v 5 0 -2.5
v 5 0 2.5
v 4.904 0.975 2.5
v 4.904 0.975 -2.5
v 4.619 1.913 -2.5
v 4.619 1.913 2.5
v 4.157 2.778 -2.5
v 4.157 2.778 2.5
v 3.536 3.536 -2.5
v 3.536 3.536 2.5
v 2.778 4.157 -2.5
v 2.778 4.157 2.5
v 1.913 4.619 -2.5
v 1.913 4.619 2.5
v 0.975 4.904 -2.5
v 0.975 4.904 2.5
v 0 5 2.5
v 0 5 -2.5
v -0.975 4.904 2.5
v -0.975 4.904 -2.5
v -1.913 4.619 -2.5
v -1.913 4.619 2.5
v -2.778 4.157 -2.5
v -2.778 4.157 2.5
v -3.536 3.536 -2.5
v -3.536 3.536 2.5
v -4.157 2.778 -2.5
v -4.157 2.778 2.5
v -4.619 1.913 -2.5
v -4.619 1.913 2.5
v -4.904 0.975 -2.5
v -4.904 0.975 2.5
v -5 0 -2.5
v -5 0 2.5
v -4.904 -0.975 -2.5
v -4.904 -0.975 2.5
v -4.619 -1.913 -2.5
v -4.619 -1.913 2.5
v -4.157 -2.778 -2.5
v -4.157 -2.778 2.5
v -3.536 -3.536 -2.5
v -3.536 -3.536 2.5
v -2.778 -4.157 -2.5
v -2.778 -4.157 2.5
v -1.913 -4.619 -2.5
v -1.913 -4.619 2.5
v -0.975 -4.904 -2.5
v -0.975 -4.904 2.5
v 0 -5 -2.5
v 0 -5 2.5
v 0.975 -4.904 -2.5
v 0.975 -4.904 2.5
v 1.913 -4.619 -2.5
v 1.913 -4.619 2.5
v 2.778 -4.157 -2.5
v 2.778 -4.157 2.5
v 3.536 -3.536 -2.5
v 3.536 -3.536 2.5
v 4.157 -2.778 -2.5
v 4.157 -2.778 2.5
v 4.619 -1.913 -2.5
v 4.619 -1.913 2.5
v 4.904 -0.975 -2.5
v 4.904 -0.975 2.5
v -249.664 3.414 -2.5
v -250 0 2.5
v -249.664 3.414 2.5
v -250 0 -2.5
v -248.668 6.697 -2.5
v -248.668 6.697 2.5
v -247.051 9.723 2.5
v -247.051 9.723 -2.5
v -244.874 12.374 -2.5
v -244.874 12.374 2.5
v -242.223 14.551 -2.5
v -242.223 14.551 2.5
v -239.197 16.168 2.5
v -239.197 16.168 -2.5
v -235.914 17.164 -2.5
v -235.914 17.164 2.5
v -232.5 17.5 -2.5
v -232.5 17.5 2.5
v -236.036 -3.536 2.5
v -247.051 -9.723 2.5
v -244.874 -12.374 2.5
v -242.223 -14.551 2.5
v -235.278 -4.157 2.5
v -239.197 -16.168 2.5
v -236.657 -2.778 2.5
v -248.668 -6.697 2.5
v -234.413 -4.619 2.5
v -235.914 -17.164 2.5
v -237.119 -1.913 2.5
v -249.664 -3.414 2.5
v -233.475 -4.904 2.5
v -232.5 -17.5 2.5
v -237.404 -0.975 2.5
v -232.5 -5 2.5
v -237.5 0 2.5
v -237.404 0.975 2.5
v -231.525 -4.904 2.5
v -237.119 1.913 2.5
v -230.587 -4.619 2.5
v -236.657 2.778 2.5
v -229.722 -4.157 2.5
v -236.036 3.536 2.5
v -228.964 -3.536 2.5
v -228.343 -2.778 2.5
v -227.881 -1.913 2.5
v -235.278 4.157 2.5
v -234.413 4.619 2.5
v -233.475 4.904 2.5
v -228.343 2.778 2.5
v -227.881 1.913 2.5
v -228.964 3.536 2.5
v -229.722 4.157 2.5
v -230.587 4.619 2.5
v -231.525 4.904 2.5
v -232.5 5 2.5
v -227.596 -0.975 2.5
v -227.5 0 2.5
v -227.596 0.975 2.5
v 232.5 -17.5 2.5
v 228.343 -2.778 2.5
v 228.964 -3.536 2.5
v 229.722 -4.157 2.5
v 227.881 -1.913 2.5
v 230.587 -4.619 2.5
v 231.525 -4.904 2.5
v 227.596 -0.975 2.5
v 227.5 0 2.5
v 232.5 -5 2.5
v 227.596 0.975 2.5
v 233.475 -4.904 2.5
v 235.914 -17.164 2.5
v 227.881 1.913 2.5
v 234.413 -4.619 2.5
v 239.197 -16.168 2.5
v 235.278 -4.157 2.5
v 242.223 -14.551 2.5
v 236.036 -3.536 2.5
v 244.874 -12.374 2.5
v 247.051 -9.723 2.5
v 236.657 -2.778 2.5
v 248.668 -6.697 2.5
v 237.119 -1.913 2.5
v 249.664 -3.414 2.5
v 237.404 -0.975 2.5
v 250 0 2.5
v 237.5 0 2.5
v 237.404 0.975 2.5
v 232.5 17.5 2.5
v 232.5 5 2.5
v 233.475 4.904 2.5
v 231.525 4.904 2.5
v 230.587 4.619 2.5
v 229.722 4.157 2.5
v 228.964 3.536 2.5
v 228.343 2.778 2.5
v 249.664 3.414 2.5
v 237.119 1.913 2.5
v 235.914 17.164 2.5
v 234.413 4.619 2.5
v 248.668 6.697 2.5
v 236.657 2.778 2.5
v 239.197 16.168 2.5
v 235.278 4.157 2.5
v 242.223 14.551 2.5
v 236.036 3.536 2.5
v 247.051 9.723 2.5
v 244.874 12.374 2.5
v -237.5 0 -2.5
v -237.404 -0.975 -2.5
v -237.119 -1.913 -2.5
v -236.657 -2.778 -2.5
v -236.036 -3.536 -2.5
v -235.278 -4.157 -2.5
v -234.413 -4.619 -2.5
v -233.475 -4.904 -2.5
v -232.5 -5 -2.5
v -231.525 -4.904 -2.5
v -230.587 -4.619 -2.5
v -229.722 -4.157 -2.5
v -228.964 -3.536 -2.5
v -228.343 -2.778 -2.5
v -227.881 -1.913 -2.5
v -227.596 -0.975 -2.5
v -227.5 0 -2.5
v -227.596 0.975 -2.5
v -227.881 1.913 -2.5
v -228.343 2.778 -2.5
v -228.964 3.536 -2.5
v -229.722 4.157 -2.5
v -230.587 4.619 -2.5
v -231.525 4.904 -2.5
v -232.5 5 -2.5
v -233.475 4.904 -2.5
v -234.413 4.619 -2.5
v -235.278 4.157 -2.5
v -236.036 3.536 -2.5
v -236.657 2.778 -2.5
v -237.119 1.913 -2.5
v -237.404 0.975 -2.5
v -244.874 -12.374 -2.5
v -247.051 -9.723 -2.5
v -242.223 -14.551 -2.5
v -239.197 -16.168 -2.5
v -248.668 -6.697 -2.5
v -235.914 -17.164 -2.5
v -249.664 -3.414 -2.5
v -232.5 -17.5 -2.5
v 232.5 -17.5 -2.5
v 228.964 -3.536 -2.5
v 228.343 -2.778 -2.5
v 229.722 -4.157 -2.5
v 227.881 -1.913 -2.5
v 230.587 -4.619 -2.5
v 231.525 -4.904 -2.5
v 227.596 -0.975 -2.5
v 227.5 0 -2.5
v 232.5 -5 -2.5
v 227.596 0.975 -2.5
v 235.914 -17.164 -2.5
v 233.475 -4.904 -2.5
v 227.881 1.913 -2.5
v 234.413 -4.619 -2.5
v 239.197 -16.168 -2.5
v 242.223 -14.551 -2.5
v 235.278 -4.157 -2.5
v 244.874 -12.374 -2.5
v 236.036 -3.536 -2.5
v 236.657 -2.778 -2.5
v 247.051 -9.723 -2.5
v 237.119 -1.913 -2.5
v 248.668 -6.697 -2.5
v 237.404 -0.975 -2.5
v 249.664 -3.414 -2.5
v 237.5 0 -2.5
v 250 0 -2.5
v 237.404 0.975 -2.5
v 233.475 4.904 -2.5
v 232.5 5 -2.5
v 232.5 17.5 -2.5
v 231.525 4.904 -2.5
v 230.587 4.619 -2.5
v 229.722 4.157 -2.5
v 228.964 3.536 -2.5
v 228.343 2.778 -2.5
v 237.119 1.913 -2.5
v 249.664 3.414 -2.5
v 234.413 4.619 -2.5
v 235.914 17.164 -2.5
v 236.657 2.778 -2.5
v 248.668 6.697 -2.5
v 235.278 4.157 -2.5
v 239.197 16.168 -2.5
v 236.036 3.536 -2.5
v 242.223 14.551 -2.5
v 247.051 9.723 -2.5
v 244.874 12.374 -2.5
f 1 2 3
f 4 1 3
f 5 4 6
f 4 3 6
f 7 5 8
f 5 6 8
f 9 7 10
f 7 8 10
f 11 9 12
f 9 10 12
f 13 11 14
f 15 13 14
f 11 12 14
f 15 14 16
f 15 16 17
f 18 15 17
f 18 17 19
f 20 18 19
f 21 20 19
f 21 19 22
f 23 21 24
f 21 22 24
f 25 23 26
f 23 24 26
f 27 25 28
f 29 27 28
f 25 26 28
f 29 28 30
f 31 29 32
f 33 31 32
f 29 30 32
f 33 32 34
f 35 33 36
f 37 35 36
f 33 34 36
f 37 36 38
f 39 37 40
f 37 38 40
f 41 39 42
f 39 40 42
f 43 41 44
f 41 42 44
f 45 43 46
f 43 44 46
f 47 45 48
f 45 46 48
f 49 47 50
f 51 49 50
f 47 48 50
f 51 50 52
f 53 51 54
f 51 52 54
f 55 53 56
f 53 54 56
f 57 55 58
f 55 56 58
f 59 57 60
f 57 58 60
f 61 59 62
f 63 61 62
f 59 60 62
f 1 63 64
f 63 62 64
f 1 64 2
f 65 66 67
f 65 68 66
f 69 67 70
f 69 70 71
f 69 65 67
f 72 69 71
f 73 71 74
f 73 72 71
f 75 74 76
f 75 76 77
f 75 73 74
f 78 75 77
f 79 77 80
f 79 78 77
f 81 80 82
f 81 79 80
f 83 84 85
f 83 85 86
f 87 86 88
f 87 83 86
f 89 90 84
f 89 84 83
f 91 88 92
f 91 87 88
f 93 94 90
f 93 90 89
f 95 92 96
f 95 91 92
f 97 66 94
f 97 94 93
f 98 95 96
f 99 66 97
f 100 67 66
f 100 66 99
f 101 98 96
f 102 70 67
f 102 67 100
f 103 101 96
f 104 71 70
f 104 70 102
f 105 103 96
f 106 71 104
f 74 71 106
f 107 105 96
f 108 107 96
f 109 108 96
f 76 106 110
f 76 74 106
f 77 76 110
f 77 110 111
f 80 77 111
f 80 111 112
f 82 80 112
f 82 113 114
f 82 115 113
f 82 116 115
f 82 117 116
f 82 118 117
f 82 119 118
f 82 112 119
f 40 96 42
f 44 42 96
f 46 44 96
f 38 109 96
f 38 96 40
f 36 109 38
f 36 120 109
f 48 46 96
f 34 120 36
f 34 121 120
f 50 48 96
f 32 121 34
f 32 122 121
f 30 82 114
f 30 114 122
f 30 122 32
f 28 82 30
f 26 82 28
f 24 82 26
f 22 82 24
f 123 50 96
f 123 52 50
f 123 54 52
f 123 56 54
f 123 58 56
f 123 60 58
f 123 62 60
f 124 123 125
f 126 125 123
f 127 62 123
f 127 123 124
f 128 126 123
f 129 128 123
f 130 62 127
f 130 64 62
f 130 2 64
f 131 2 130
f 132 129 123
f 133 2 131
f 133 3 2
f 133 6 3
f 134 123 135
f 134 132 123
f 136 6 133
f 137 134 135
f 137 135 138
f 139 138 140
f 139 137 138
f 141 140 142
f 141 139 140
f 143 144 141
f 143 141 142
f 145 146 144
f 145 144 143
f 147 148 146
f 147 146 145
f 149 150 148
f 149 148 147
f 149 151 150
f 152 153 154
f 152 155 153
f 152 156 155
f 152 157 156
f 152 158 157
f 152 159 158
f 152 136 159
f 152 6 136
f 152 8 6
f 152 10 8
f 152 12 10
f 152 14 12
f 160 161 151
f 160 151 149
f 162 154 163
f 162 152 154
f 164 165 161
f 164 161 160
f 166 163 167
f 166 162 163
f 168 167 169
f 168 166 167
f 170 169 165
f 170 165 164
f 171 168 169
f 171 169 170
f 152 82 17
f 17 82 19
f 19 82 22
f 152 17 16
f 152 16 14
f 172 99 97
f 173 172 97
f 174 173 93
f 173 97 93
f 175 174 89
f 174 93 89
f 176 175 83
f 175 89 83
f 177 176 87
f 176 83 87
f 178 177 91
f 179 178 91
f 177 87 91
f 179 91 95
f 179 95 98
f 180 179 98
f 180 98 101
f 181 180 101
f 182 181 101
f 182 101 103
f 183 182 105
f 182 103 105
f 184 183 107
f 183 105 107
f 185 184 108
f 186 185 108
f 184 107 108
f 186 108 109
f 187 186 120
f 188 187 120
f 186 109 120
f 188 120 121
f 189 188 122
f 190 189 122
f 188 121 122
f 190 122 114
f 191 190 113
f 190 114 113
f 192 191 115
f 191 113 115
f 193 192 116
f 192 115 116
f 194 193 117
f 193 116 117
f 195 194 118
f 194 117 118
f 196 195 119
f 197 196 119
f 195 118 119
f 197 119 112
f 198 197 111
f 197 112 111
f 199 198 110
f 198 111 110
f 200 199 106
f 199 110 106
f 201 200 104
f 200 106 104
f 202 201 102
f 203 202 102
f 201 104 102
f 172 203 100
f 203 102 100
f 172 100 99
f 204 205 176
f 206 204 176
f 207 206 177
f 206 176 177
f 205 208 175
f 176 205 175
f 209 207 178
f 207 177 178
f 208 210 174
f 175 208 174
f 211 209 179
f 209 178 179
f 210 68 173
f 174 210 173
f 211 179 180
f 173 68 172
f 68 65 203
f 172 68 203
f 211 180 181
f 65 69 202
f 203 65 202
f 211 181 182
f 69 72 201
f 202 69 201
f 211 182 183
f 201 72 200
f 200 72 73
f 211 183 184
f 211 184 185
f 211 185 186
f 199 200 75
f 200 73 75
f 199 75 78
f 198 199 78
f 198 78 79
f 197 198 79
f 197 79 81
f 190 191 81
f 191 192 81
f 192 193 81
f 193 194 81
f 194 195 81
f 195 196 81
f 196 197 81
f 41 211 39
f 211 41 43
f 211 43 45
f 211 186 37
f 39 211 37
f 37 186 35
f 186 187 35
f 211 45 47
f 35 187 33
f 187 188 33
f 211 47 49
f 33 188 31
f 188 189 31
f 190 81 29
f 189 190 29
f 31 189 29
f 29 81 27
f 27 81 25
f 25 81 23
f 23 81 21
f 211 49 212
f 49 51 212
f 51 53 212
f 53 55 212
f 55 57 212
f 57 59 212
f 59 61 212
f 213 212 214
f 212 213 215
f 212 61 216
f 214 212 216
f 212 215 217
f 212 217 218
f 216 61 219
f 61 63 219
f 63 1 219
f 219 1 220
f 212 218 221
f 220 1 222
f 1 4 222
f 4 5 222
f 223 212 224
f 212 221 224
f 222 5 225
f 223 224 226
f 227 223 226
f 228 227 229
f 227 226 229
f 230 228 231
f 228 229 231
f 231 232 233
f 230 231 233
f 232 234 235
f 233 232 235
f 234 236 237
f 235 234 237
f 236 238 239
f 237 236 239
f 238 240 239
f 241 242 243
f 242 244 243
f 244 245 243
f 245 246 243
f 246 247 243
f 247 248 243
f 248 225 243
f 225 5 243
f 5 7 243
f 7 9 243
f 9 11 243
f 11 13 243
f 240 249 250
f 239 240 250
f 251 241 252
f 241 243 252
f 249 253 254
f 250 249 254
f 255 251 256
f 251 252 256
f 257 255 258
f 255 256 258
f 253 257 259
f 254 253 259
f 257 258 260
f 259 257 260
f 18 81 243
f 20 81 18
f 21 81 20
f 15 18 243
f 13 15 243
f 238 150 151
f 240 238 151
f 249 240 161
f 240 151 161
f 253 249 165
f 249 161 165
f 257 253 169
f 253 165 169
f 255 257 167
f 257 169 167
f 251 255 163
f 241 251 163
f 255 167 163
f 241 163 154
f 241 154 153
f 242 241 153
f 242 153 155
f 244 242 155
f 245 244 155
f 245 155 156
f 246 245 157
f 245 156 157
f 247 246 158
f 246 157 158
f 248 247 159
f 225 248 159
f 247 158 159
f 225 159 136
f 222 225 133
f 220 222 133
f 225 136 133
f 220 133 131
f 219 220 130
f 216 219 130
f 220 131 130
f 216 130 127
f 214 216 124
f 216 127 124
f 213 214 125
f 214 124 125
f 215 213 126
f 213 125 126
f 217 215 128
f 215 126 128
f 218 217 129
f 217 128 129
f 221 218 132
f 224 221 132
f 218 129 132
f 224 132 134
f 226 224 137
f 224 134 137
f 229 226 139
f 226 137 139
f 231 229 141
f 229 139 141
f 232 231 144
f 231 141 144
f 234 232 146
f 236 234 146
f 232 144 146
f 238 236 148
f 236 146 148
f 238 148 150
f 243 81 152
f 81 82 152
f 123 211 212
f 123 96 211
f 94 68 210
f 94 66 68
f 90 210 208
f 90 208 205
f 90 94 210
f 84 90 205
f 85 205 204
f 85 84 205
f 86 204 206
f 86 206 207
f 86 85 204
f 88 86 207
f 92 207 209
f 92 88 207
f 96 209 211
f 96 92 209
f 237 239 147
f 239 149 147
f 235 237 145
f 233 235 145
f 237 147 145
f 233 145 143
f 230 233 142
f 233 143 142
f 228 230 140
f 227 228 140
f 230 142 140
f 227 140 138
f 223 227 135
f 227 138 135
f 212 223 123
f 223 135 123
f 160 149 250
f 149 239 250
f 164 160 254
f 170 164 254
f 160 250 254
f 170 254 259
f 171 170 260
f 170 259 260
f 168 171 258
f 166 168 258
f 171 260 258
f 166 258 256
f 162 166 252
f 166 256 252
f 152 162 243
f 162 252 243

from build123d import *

# Parameters (mm, degrees)
SKETCH1_W           = 500
SKETCH1_H           = 35
BOSS_EXTRUDE1_DEPTH = 2.5
FILLET1_R           = 17.5
SKETCH2_R           = 5
CUT_EXTRUDE1_DEPTH  = 5


with BuildPart() as part:
    # Sketch1 → Boss-Extrude1 (new, symmetric)
    with BuildSketch(Plane.XY):
        Rectangle(SKETCH1_W, SKETCH1_H)
    extrude(amount=BOSS_EXTRUDE1_DEPTH, both=True)

    # Fillet1
    fillet1_edges = [part.edges().sort_by_distance(p)[0] for p in [
        (-250, -17.5, 0),
        (-250, 17.5, 0),
        (250, -17.5, 0),
        (250, 17.5, 0),
    ]]
    fillet(fillet1_edges, radius=FILLET1_R - 0.0001)  # a hair under: the kernel refuses the full size

    # Sketch2 → Cut-Extrude1 (cut)
    with BuildSketch(Plane.XY.offset(2.5)):
        Circle(SKETCH2_R)
        with Locations((232.5, 0)):
            Circle(SKETCH2_R)
        with Locations(Location((-232.5, 0, 0), (0, 0, 180))):
            Circle(SKETCH2_R)
    extrude(amount=-CUT_EXTRUDE1_DEPTH, mode=Mode.SUBTRACT)


solid = part.part
